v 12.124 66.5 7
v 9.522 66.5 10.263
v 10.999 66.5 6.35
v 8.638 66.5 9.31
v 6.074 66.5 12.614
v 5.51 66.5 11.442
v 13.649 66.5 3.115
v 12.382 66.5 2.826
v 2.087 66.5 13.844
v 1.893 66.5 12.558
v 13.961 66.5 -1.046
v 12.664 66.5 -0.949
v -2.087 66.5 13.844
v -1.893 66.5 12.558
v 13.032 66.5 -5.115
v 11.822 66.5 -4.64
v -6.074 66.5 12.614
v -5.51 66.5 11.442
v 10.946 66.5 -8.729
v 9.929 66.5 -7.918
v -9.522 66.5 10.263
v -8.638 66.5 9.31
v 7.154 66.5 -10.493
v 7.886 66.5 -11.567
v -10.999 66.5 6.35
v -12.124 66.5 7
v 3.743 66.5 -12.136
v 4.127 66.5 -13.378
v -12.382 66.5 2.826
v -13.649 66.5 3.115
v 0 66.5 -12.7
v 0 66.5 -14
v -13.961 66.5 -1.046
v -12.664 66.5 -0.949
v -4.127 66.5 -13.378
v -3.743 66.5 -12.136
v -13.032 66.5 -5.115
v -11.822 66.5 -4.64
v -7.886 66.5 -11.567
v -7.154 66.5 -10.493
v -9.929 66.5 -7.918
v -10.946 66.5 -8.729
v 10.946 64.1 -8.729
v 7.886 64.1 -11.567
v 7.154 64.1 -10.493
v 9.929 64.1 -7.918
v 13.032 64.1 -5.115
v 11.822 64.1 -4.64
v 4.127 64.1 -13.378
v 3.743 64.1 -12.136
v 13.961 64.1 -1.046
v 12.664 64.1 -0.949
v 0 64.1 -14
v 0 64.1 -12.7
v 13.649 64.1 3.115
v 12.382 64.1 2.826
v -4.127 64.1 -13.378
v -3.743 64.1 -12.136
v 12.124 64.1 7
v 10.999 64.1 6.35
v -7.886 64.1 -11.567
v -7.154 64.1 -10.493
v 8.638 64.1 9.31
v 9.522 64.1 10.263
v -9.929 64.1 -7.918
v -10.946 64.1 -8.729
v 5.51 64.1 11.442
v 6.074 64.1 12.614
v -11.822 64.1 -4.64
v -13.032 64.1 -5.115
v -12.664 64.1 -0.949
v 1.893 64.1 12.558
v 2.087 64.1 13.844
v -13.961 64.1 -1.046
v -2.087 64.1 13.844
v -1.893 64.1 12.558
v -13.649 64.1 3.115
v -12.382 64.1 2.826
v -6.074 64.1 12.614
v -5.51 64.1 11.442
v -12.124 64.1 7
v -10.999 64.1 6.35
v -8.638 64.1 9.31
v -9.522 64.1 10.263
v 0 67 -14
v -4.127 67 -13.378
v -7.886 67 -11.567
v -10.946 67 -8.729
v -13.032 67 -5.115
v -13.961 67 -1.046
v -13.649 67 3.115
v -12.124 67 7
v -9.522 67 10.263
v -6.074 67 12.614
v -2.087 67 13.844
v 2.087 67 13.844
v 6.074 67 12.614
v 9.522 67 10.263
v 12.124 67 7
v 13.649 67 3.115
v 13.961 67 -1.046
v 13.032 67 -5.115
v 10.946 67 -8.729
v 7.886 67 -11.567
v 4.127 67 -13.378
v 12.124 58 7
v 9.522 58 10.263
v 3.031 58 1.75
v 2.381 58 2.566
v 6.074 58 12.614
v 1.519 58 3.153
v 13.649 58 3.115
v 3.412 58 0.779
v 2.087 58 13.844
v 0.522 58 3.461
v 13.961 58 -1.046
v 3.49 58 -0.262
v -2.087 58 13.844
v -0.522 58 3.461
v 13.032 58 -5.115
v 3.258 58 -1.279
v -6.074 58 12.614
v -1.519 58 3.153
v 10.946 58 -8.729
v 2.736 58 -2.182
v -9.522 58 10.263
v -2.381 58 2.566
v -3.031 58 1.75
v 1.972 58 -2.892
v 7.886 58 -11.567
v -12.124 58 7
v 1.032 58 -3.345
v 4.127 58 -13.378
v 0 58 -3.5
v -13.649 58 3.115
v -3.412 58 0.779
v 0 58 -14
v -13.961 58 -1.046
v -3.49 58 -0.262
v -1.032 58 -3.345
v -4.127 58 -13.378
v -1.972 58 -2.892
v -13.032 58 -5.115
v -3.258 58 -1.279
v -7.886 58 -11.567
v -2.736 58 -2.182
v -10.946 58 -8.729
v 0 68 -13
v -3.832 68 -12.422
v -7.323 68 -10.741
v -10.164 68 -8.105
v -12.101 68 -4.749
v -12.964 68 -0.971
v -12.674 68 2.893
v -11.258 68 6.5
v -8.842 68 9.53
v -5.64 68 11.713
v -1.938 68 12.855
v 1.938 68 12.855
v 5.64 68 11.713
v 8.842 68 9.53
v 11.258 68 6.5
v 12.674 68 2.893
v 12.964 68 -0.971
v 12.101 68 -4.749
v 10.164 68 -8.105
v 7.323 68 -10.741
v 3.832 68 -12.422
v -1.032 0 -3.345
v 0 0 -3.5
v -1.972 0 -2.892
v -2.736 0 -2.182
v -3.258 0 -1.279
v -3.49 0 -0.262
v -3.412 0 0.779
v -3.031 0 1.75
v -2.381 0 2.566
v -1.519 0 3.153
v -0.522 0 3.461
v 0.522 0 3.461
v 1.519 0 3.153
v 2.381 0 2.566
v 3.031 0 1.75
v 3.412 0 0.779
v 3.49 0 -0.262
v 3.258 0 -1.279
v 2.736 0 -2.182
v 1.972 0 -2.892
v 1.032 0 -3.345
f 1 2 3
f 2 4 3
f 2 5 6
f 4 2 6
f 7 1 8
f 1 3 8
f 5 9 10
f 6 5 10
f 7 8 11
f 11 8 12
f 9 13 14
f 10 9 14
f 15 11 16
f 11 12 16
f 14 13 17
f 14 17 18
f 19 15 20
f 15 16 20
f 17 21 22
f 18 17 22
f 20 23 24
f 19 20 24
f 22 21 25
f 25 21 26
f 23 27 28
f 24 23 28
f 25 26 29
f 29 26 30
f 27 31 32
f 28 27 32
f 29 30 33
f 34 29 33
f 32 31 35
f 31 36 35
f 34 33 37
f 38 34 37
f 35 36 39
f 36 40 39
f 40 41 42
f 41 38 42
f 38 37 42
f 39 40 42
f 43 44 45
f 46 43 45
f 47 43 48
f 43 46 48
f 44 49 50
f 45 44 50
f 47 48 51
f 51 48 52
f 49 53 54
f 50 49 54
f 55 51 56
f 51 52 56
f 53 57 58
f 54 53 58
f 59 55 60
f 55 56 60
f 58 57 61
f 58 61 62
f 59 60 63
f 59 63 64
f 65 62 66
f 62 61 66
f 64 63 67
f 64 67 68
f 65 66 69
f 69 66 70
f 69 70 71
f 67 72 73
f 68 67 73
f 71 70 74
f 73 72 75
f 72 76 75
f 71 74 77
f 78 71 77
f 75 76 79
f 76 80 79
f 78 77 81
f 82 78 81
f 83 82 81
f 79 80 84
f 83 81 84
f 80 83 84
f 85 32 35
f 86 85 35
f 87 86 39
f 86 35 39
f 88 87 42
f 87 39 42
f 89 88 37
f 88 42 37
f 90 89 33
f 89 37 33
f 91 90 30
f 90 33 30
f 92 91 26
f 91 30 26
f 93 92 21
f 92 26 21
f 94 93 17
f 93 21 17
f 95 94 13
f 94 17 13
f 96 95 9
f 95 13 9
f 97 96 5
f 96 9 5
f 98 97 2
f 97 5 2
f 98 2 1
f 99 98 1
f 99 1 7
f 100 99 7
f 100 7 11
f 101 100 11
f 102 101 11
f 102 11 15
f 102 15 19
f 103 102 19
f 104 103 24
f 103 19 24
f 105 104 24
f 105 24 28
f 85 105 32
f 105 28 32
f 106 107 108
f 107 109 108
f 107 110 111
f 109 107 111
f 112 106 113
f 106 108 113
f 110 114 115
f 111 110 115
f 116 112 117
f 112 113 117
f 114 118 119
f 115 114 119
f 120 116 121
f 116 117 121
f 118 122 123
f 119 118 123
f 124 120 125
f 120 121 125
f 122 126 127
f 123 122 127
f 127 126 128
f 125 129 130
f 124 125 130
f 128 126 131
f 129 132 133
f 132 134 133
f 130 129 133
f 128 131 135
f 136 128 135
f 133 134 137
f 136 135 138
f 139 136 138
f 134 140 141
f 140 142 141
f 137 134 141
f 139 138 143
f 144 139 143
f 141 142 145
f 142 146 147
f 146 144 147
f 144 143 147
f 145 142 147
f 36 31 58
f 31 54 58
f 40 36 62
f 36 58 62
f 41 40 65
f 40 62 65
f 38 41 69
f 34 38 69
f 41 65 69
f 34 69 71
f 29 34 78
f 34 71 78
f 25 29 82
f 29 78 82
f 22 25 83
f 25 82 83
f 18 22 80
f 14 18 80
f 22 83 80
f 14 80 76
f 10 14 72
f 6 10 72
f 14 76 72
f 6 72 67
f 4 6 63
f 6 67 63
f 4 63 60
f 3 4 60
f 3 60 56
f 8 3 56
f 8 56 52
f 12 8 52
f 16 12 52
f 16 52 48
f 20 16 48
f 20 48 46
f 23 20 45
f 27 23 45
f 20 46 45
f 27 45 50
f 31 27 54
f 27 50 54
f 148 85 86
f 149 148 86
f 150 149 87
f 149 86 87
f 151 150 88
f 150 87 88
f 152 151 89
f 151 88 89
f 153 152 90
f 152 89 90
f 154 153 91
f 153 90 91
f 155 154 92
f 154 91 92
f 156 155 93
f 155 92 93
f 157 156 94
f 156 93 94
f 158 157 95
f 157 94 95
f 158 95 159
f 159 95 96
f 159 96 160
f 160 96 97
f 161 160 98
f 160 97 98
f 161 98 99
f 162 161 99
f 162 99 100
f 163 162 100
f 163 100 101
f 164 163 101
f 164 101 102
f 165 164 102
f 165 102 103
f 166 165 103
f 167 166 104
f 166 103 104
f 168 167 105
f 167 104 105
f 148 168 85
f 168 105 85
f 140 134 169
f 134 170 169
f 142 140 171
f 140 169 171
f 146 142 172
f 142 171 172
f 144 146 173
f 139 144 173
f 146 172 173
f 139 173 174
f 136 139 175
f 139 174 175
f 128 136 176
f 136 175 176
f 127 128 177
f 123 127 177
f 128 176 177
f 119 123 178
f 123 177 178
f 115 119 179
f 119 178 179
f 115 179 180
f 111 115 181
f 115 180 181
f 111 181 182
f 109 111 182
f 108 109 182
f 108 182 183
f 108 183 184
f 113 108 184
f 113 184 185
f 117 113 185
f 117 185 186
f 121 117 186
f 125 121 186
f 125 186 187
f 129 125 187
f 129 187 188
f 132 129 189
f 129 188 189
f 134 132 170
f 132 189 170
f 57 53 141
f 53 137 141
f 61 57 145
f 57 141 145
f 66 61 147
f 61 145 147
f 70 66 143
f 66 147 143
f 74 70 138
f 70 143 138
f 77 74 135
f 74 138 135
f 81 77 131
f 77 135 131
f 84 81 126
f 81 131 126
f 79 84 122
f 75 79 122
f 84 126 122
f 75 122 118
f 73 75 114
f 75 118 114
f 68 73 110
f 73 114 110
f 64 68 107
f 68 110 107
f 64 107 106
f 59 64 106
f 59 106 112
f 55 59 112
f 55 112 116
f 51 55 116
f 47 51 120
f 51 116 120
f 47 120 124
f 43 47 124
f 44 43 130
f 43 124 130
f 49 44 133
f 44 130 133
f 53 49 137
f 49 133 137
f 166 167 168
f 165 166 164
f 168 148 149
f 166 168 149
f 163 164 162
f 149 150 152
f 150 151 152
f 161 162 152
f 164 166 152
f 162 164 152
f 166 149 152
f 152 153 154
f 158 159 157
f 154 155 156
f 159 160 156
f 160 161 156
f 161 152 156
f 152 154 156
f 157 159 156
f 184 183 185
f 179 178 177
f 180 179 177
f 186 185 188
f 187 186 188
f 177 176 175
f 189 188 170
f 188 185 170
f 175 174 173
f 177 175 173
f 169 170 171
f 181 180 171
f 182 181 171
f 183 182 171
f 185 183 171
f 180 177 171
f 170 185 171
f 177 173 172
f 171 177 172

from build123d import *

# Parameters (mm, degrees)
SMUSSO1_SIZE = 1


with BuildPart() as part:
    # Schizzo1 → Rivoluzione1 (revolve)
    with BuildSketch(Plane.XY, mode=Mode.PRIVATE) as rivoluzione1_sk:
        Polygon((-3.5, 0), (0, 0), (0, 68), (-14, 68), (-14, 66.5), (-12.7, 66.5), (-12.7, 64.1), (-14, 64.1), (-14, 58), (-3.5, 58), align=None)
    revolve(rivoluzione1_sk.sketch.rotate(Axis((0, 0, 0), (0, 1, 0)), 270), axis=Axis((0, 0, 0), (0, 1, 0)))

    # Smusso1
    smusso1_edges = [part.edges().sort_by_distance(p)[0] for p in [
        (0, 68, 14),
    ]]
    chamfer(smusso1_edges, length=SMUSSO1_SIZE)


solid = part.part
